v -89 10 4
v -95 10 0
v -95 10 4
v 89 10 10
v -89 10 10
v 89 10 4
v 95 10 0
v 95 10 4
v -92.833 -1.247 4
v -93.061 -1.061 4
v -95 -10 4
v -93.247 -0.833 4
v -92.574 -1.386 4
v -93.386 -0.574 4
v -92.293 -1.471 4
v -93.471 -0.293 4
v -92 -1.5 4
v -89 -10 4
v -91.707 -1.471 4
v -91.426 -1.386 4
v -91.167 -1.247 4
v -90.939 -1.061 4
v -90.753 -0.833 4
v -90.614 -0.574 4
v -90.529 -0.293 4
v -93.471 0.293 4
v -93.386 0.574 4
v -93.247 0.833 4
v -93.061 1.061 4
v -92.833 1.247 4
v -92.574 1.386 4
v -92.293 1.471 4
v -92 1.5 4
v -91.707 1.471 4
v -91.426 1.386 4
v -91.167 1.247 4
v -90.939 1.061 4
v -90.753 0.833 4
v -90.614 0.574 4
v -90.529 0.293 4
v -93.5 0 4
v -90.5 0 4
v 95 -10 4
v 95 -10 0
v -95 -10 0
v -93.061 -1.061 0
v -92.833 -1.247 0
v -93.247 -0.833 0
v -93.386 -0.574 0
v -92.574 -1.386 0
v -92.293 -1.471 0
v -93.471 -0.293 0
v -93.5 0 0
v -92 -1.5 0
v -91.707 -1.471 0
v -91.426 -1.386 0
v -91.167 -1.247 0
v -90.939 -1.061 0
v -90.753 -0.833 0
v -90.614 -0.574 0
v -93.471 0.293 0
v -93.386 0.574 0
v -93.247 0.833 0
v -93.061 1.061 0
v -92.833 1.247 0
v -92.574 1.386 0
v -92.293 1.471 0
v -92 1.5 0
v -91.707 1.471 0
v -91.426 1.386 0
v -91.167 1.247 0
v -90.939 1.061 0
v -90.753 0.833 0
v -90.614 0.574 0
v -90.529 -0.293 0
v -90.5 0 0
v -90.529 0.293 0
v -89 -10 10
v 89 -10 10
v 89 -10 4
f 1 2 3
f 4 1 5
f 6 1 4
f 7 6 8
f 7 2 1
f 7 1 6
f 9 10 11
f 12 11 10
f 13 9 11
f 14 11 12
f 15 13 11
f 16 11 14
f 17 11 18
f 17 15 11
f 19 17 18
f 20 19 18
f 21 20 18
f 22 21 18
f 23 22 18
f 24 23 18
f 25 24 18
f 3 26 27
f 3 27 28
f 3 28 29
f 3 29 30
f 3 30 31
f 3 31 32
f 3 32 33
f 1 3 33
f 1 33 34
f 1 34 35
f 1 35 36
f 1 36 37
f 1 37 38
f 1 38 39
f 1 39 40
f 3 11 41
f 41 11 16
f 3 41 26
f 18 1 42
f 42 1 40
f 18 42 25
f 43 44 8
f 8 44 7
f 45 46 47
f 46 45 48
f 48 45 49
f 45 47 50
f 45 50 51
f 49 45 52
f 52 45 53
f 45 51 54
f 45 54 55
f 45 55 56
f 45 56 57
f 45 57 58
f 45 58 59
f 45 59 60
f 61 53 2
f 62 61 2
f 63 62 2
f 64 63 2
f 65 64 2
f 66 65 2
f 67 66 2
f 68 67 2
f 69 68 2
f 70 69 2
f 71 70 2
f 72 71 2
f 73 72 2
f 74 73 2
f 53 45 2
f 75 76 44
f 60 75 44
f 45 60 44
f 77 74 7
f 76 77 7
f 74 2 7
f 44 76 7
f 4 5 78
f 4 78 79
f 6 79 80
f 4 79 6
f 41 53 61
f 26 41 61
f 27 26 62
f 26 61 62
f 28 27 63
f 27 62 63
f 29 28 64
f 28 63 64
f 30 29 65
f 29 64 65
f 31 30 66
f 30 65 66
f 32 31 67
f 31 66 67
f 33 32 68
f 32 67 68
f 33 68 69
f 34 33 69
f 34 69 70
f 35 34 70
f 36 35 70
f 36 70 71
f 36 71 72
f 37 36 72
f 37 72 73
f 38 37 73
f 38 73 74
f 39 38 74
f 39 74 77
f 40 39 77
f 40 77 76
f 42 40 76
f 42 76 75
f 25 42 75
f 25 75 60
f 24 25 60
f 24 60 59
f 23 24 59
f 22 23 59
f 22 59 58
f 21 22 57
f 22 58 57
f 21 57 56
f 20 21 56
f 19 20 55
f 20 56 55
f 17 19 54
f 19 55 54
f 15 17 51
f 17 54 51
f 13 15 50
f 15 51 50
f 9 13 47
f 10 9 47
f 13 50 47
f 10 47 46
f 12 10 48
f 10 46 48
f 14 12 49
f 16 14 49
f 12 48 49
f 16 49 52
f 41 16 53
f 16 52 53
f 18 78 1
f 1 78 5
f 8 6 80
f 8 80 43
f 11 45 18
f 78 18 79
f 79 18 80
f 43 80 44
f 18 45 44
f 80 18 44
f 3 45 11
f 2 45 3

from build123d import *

# Parameters (mm, degrees)
ESQUISSE1_W             = 190
ESQUISSE1_H             = 20
BOSS_EXTRU_1_DEPTH      = 10
ESQUISSE2_W             = 6
ESQUISSE2_H             = 20
ENL_V_MAT_EXTRU_1_DEPTH = 6
ESQUISSE3_R             = 1.5
ENL_V_MAT_EXTRU_2_DEPTH = 6


with BuildPart() as part:
    # Esquisse1 → Boss.-Extru.1 (new body)
    with BuildSketch(Plane.XY):
        Rectangle(ESQUISSE1_W, ESQUISSE1_H)
    extrude(amount=BOSS_EXTRU_1_DEPTH)

    # Esquisse2 → Enlèv. mat.-Extru.1 (cut)
    with BuildSketch(Plane.XY.offset(10)):
        with Locations((-92, 0)):
            Rectangle(ESQUISSE2_W, ESQUISSE2_H)
        with Locations((92, 0)):
            Rectangle(ESQUISSE2_W, ESQUISSE2_H)
    extrude(amount=-ENL_V_MAT_EXTRU_1_DEPTH, mode=Mode.SUBTRACT)

    # Esquisse3 → Enlèv. mat.-Extru.2 (cut)
    with BuildSketch(Plane(origin=(0, 0, 0), x_dir=(-1, 0, 0), z_dir=(0, 0, -1))):
        with Locations((92, 0)):
            Circle(ESQUISSE3_R)
    extrude(amount=-ENL_V_MAT_EXTRU_2_DEPTH, mode=Mode.SUBTRACT)


solid = part.part
